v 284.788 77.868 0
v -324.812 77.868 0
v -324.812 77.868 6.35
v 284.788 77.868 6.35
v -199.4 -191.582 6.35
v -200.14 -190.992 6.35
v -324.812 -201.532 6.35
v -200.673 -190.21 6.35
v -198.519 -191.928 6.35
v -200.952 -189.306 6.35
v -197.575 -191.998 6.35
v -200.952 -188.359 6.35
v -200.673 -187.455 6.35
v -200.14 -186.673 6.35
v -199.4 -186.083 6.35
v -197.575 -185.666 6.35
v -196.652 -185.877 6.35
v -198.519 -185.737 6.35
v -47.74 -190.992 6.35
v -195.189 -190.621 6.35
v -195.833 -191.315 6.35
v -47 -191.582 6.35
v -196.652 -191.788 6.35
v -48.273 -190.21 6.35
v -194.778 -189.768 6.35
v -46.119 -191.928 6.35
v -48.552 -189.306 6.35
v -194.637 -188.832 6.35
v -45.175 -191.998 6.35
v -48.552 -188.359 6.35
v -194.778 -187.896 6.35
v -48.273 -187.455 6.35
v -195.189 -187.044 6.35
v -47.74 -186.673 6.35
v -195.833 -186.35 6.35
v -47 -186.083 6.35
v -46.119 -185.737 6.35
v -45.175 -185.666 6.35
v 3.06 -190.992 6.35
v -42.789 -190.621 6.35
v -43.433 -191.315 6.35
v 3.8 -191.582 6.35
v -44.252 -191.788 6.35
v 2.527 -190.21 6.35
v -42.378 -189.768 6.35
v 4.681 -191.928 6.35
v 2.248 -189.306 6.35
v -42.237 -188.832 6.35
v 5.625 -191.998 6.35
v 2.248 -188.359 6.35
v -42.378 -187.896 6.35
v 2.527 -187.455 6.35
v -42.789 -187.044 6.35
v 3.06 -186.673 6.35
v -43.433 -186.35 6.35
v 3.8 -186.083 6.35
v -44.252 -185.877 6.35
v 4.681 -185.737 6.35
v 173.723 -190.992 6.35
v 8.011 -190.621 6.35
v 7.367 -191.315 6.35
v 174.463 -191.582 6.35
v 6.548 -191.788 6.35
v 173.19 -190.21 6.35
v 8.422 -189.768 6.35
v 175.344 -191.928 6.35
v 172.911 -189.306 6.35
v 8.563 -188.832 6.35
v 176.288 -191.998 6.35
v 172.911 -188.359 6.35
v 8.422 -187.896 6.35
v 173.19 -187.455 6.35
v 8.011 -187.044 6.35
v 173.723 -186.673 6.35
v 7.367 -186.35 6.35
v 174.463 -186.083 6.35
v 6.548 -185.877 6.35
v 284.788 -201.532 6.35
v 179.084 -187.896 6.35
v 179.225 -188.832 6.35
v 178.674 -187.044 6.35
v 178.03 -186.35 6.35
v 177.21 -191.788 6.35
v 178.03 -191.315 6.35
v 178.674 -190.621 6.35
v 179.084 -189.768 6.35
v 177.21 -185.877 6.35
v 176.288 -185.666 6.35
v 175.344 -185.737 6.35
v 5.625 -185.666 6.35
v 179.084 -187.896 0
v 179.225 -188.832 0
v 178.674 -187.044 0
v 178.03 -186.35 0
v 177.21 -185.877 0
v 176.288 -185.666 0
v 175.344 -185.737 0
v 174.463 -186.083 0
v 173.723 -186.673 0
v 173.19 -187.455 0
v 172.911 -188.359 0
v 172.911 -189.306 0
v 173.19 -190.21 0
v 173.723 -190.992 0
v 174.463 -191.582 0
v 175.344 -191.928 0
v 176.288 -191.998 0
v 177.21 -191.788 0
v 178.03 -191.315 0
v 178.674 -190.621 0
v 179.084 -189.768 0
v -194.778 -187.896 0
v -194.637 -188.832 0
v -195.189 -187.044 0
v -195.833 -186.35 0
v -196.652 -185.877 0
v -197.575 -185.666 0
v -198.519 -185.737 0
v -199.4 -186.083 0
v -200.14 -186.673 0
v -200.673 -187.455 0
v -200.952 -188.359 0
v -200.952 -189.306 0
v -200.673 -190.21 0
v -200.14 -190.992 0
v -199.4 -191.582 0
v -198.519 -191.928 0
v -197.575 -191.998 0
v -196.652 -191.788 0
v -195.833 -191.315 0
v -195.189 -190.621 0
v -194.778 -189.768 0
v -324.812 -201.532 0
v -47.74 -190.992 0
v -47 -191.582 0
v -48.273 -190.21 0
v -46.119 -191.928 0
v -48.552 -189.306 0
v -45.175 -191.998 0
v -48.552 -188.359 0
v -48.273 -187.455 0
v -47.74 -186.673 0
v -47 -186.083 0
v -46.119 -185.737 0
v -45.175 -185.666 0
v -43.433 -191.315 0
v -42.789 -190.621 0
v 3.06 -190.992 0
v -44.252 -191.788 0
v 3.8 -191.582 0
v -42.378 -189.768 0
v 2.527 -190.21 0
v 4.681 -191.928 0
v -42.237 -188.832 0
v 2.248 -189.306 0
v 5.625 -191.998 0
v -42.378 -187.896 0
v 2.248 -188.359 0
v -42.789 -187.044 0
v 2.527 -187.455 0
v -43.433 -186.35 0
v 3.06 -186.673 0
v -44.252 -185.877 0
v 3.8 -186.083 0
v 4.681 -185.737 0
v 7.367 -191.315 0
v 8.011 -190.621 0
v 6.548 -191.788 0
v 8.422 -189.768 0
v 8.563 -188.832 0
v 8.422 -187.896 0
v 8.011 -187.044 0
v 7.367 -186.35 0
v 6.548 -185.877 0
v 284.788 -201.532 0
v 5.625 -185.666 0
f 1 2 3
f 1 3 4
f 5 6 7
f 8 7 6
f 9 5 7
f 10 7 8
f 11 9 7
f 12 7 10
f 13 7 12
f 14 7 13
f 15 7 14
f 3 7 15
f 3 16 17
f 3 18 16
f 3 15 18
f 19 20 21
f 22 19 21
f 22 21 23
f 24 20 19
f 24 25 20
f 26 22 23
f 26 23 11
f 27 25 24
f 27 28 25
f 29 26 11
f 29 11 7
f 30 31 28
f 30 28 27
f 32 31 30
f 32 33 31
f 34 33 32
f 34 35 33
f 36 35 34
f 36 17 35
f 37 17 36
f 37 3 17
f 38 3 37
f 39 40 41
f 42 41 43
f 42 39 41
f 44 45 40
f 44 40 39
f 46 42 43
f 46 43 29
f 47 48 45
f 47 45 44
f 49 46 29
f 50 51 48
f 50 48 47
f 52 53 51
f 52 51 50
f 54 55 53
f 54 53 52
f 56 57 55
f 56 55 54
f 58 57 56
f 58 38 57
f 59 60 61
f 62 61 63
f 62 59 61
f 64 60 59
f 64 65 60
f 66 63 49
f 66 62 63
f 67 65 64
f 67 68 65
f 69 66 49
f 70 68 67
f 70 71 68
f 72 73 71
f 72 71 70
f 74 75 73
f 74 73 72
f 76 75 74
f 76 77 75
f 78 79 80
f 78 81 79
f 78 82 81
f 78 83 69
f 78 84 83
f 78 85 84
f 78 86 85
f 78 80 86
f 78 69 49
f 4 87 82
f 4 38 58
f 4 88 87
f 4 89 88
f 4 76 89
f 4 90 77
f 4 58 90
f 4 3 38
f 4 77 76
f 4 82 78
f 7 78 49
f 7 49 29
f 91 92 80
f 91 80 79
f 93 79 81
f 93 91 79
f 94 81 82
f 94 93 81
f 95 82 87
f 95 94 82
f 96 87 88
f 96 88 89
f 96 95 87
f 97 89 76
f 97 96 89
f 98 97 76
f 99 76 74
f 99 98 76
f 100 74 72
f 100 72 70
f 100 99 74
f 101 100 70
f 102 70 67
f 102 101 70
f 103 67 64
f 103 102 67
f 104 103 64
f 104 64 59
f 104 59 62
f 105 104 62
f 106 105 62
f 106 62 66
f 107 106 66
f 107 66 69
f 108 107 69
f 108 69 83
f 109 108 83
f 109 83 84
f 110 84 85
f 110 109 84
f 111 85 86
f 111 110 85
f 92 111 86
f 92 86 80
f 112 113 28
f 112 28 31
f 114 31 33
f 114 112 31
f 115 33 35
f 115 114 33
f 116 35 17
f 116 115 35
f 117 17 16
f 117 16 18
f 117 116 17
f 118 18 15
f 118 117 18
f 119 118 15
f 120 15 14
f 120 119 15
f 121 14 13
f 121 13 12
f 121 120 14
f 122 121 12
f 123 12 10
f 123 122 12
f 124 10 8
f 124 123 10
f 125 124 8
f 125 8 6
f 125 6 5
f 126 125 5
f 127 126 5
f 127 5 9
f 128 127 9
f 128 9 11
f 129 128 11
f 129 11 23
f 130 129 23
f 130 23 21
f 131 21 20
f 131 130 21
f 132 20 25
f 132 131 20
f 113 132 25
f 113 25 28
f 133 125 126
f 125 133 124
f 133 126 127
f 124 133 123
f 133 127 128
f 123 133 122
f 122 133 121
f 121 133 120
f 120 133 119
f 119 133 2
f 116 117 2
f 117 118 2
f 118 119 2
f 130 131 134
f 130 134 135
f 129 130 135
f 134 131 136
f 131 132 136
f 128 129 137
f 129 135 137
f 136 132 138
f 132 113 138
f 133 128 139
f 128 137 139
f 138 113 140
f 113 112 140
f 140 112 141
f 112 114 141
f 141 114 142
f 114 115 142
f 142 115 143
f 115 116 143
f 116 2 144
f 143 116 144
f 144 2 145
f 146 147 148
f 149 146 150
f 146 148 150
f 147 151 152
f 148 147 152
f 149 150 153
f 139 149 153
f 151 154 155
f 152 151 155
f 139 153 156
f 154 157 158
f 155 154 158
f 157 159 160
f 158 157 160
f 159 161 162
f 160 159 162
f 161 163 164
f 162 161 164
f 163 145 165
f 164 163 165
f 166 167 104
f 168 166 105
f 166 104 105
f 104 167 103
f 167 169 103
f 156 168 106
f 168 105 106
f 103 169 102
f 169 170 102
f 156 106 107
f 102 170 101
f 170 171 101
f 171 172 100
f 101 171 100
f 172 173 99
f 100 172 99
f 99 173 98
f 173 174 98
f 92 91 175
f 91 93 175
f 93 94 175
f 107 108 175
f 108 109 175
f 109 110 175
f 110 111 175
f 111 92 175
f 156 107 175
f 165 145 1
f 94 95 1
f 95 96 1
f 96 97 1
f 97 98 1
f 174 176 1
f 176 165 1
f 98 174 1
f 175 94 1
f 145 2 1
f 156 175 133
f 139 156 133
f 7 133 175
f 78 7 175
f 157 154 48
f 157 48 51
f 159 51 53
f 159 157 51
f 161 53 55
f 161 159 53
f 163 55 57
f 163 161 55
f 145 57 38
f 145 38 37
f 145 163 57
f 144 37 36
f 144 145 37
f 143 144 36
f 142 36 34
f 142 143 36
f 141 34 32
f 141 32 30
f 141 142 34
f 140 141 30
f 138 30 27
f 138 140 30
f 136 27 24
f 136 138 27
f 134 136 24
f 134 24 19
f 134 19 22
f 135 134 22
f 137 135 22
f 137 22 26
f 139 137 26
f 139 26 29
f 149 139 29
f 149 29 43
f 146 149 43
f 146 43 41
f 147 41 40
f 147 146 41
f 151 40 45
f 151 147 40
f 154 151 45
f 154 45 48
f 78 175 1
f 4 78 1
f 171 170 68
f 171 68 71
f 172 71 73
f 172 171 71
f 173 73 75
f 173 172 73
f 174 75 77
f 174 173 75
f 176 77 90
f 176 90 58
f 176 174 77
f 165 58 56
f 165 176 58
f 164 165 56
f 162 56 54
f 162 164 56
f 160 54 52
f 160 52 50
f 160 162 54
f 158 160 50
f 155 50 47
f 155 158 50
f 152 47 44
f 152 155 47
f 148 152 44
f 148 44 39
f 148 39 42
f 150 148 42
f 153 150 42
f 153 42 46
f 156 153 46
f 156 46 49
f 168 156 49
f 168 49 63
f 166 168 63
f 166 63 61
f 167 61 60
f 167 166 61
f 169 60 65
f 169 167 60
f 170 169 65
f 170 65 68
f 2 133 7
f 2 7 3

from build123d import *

# Parameters (mm, degrees)
SKETCH1_W           = 152.4
SKETCH1_H           = 279.4
SKETCH1_R           = 3.175
BOSS_EXTRUDE1_DEPTH = 6.35


with BuildPart() as part:
    # Sketch1 → Boss-Extrude1 (new body)
    # profile 1 of 4: a face of its own
    with BuildSketch(Plane.XY):
        with Locations((-248.612121212, -61.832323232)):
            Rectangle(SKETCH1_W, SKETCH1_H)
        with Locations((-197.812121212, -188.832323232)):
            Circle(SKETCH1_R, mode=Mode.SUBTRACT)
    # profile 2 of 4: a face of its own
    with BuildSketch(Plane.XY):
        with Locations((-96.212121212, -61.832323232)):
            Rectangle(SKETCH1_W, SKETCH1_H)
        with Locations((-45.412121212, -188.832323232)):
            Circle(SKETCH1_R, mode=Mode.SUBTRACT)
    # profile 3 of 4: a face of its own
    with BuildSketch(Plane.XY):
        with Locations((56.187878788, -61.832323232)):
            Rectangle(SKETCH1_W, SKETCH1_H)
        with Locations((5.387878788, -188.832323232)):
            Circle(SKETCH1_R, mode=Mode.SUBTRACT)
    # profile 4 of 4: a face of its own
    with BuildSketch(Plane.XY):
        with Locations((208.587878788, -61.832323232)):
            Rectangle(SKETCH1_W, SKETCH1_H)
        with Locations((176.050478788, -188.832323232)):
            Circle(SKETCH1_R, mode=Mode.SUBTRACT)
    extrude(amount=BOSS_EXTRUDE1_DEPTH)


solid = part.part
